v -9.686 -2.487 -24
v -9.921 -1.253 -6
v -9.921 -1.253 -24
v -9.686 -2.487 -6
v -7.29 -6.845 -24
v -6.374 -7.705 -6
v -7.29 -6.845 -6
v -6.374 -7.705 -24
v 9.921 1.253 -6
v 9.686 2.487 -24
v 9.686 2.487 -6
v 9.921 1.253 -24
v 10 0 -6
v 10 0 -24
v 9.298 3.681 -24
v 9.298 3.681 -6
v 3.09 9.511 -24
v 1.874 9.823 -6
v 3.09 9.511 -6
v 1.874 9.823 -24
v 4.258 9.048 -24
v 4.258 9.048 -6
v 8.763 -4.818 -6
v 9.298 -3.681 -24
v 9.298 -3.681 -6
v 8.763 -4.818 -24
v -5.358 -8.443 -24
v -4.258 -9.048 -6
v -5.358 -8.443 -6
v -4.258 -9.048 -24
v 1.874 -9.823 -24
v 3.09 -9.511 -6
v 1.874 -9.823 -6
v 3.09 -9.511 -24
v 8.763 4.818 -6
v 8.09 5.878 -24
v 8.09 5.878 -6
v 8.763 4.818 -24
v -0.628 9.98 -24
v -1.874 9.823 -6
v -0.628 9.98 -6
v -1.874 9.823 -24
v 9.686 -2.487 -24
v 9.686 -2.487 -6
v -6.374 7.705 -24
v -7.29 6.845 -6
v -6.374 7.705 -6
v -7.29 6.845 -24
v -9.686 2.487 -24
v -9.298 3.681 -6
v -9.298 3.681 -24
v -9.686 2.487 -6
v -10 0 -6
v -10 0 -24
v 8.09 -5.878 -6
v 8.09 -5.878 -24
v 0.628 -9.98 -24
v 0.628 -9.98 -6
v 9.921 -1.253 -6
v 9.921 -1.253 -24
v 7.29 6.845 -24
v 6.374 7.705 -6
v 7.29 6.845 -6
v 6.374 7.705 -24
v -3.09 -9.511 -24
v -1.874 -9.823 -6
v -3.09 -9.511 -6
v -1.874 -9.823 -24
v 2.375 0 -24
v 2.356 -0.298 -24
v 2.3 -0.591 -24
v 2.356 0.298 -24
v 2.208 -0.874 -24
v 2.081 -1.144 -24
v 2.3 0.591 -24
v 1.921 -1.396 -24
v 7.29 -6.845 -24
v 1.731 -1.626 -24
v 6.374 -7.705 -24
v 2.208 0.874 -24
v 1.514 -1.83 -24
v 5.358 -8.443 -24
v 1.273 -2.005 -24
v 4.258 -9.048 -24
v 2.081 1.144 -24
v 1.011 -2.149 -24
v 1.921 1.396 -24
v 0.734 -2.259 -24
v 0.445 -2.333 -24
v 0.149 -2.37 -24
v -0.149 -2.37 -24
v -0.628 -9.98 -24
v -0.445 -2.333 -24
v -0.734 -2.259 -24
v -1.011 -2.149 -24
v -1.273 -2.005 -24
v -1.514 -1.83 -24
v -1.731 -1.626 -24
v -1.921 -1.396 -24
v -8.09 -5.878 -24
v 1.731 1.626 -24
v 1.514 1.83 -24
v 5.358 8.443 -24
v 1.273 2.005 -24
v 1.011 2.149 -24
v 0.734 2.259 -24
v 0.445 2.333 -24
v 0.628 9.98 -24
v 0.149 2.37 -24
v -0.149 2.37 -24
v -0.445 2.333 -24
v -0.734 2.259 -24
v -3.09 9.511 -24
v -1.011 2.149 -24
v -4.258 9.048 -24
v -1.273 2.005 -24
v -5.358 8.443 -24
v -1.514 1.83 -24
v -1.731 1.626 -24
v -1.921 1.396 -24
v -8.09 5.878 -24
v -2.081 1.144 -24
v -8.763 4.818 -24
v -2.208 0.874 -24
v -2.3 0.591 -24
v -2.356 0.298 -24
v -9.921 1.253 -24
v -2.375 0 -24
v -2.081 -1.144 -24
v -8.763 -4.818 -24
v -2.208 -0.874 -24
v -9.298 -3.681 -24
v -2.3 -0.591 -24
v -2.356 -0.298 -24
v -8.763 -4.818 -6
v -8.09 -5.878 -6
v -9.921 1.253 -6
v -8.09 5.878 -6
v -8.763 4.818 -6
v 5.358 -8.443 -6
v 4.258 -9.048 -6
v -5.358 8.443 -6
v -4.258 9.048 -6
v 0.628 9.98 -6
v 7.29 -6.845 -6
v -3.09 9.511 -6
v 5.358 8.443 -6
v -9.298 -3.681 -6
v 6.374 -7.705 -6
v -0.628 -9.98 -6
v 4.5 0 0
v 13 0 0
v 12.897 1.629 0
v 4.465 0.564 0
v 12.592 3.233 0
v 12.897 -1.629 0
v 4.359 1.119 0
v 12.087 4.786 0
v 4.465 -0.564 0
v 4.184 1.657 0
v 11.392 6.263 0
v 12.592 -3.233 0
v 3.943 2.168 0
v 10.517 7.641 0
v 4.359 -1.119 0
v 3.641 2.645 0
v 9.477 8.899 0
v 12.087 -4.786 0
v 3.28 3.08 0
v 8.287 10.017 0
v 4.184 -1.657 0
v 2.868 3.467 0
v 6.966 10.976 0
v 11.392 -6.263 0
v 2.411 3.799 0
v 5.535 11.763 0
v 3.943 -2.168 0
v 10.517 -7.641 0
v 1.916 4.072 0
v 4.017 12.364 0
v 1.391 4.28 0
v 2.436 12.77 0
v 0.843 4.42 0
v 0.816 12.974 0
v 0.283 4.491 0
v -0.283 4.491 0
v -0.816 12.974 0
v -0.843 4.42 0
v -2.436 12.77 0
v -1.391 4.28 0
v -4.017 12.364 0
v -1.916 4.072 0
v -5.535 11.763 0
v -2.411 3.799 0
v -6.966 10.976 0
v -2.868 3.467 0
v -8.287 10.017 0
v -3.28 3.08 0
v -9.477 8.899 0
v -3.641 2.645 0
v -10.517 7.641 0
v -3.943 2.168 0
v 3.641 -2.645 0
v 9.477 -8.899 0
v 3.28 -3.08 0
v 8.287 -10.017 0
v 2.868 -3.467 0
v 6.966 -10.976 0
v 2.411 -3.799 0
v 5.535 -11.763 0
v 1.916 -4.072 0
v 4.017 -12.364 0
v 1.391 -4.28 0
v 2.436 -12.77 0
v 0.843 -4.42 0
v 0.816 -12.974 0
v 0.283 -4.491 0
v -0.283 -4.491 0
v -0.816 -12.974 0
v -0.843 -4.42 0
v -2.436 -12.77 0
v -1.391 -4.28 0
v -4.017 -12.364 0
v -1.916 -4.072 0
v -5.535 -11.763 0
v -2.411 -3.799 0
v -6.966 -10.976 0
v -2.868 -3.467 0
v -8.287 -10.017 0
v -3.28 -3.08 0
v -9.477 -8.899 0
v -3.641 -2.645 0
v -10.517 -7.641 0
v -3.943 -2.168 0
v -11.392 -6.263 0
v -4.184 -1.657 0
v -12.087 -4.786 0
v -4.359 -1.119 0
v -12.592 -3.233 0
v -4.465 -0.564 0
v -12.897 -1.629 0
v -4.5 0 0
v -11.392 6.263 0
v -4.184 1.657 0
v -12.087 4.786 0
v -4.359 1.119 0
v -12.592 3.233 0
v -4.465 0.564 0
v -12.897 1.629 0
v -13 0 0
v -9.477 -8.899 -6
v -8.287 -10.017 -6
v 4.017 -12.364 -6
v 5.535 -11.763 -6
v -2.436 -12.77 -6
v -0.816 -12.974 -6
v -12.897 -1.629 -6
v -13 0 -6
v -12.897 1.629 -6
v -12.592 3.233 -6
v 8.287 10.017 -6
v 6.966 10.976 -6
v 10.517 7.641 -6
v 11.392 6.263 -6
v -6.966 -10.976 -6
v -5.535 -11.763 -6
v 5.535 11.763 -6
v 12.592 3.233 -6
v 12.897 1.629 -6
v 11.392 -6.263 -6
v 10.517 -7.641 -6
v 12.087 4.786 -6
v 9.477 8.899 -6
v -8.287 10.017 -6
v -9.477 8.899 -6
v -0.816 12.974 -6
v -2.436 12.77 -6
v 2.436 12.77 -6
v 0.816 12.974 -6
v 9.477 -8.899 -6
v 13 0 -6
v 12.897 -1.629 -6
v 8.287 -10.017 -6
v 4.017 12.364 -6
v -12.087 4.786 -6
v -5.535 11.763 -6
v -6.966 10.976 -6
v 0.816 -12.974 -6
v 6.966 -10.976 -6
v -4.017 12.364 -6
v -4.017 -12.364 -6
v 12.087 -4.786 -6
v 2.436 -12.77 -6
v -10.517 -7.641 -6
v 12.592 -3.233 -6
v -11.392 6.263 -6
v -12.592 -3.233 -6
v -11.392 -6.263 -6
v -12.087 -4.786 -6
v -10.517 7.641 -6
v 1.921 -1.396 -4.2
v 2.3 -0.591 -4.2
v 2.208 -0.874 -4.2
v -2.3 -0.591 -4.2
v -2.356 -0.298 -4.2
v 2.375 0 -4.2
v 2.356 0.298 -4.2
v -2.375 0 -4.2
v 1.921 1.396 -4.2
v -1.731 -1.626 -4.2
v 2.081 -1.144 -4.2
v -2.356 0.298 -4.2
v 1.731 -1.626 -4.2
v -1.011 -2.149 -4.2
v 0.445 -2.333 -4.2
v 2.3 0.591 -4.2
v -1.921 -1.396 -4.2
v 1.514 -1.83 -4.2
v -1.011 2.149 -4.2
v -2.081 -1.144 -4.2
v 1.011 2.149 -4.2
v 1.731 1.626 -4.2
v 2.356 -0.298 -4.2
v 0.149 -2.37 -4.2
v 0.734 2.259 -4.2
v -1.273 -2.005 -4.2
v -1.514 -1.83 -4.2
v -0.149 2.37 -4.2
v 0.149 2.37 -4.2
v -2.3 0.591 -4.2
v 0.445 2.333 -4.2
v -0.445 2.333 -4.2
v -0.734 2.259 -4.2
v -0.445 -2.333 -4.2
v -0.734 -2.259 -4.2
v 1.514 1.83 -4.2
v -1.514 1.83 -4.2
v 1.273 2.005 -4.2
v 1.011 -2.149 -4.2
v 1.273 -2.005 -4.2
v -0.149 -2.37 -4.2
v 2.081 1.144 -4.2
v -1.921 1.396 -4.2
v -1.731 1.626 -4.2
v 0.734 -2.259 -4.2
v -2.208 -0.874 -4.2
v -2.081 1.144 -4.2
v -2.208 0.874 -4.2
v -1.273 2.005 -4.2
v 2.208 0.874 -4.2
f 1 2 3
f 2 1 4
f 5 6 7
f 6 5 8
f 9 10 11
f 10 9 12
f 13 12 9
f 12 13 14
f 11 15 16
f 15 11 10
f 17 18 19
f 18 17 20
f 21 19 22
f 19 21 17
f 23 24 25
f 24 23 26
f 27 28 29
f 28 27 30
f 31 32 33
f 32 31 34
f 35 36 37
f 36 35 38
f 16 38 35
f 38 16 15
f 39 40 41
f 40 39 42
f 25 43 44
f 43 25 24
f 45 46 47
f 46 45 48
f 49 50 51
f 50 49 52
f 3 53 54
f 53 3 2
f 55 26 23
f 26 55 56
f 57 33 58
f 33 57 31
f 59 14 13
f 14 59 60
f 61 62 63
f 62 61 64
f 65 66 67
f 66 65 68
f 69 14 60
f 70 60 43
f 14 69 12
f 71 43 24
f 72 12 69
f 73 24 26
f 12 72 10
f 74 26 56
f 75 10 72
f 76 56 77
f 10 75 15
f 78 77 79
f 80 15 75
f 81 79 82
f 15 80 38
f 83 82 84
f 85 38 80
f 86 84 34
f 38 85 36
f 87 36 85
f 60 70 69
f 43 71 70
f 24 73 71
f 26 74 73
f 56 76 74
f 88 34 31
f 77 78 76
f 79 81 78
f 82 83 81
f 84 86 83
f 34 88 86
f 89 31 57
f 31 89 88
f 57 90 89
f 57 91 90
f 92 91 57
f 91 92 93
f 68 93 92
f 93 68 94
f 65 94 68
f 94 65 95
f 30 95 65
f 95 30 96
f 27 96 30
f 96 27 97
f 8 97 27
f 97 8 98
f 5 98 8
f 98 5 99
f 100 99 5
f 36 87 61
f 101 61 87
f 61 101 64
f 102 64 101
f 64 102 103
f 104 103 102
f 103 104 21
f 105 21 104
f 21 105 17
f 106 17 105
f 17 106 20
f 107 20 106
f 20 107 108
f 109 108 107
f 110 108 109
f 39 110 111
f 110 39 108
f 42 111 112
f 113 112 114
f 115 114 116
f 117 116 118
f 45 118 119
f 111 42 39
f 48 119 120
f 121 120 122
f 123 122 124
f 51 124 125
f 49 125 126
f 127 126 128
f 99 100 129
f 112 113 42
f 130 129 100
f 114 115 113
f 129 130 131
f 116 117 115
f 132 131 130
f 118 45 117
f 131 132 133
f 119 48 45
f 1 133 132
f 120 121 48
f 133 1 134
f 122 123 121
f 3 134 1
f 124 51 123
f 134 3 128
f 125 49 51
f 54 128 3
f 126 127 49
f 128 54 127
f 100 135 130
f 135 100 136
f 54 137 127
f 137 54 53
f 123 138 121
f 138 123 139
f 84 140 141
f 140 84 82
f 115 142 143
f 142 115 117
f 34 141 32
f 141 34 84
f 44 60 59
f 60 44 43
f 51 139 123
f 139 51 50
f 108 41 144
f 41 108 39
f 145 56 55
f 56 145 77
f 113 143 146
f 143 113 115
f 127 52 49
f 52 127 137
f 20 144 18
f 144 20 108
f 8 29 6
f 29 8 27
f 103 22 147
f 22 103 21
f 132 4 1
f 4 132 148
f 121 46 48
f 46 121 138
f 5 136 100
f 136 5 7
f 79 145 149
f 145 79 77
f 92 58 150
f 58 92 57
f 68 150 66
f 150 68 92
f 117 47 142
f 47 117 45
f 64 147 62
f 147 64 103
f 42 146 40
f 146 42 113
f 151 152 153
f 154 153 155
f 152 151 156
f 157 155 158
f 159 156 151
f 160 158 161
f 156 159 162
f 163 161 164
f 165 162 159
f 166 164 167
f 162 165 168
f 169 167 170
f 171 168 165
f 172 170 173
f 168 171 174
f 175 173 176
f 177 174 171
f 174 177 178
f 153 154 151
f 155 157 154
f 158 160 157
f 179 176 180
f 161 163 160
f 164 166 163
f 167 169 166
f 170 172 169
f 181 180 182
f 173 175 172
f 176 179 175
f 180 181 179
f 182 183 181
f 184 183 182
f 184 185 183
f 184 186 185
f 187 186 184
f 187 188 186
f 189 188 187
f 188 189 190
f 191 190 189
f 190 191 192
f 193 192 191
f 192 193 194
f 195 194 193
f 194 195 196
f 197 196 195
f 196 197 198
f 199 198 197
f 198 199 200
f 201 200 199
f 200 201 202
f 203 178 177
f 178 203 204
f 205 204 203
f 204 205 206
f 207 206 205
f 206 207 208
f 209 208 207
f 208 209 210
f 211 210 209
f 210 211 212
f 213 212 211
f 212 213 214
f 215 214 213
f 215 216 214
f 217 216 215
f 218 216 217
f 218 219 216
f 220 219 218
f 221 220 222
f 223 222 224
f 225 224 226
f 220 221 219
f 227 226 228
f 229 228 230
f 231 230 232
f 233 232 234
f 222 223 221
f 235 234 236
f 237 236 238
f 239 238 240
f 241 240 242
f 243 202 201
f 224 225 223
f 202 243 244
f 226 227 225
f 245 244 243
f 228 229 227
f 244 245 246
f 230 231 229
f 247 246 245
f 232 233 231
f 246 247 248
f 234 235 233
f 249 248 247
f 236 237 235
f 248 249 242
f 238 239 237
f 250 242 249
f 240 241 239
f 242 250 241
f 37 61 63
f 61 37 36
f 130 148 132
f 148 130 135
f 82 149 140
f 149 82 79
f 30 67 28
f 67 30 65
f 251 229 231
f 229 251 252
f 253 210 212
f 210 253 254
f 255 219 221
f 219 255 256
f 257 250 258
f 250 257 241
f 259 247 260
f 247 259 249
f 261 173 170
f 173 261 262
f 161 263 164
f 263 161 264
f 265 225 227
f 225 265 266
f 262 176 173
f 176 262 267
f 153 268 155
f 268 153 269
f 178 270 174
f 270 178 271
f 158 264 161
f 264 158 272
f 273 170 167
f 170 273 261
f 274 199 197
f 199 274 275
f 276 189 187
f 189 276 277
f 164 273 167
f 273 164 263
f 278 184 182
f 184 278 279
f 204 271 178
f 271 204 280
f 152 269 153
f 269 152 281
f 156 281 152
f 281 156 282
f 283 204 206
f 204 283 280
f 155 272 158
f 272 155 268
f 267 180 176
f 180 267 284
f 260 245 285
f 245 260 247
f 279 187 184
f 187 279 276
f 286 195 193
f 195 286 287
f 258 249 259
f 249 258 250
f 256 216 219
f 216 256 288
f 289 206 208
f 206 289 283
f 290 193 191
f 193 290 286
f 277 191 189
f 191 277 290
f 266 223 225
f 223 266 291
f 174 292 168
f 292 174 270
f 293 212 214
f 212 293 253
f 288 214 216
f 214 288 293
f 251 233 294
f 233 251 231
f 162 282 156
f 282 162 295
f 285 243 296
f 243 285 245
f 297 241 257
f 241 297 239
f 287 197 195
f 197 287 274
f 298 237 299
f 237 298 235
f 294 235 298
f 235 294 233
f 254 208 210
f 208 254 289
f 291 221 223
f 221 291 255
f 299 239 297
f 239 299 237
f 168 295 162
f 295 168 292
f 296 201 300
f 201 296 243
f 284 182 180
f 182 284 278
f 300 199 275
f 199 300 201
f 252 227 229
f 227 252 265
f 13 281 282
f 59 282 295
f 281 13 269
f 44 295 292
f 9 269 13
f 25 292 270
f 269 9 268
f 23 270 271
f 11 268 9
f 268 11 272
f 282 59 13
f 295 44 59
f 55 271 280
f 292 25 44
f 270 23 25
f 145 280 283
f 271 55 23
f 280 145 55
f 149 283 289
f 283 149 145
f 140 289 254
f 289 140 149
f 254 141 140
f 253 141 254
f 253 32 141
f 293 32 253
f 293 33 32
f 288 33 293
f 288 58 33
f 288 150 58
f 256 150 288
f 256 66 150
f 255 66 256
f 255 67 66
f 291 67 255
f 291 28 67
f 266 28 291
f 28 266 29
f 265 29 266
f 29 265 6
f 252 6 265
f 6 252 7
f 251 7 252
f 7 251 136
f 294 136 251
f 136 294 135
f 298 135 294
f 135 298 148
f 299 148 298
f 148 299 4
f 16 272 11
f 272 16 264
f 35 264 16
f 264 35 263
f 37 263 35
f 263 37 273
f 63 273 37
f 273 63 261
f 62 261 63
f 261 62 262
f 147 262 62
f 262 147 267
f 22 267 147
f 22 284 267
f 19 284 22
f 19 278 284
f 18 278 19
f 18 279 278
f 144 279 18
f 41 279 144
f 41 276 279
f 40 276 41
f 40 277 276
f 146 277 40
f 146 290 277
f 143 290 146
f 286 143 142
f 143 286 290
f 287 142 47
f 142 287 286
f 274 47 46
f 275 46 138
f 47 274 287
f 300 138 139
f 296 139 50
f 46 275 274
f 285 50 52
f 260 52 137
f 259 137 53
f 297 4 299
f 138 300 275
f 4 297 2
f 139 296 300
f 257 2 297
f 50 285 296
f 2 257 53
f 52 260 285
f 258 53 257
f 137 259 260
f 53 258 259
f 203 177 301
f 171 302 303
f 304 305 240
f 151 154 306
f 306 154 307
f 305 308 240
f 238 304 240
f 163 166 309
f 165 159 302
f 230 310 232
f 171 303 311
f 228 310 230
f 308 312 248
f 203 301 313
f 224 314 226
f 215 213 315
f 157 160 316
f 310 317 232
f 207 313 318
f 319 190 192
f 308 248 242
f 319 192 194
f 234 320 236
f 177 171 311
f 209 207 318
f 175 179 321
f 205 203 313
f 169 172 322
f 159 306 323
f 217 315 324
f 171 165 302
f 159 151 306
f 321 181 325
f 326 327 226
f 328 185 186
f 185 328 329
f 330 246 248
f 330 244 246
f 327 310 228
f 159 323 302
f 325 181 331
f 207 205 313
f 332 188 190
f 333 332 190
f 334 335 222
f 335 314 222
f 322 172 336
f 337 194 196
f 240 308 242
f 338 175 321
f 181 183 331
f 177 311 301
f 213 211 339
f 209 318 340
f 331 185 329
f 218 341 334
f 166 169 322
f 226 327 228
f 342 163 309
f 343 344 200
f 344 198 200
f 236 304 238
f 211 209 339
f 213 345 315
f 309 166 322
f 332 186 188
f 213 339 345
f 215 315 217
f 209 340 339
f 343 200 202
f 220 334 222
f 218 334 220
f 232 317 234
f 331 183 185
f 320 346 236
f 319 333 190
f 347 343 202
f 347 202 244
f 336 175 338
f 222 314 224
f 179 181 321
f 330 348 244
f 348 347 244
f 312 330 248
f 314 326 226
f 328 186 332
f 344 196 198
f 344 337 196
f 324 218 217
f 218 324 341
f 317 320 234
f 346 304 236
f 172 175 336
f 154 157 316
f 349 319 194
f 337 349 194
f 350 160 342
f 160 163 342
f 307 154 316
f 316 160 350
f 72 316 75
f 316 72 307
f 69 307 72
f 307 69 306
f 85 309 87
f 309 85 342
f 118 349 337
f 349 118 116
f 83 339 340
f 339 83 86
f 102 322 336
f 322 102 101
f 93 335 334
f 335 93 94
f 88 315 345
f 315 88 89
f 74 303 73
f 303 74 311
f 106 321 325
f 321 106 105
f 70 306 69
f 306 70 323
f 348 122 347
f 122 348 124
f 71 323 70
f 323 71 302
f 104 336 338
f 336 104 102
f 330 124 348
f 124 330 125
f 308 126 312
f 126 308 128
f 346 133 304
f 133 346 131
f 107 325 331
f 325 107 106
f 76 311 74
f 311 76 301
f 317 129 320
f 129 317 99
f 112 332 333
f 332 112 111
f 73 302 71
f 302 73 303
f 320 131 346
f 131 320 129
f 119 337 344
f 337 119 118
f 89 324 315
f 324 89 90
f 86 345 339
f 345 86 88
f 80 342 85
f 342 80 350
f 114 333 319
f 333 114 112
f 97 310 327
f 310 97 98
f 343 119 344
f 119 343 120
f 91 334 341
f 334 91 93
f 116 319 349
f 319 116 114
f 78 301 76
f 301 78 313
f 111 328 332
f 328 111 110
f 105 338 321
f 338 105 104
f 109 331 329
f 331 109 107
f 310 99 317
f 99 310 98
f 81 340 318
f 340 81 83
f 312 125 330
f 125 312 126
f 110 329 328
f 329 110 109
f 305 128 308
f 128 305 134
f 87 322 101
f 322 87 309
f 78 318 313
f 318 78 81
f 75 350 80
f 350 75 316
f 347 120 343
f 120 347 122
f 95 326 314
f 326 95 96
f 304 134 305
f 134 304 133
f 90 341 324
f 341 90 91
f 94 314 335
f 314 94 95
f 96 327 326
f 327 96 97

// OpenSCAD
$fn = 50;


difference() {
	union() {
		translate(v = [0, 0, -24.0000000000]) {
			cylinder(h = 24, r = 10.0000000000);
		}
		translate(v = [0, 0, -6.0000000000]) {
			cylinder(h = 6, r = 13.0000000000);
		}
	}
	union() {
		translate(v = [0, 0, 0]) {
			rotate(a = [0, 0, 0]) {
				difference() {
					union() {
						#translate(v = [0, 0, -24.0000000000]) {
							cylinder(h = 24, r = 2.2500000000);
						}
						#translate(v = [0, 0, -4.2000000000]) {
							cylinder(h = 4.2000000000, r1 = 2.3750000000, r2 = 4.5000000000);
						}
						#translate(v = [0, 0, -24.0000000000]) {
							cylinder(h = 24, r = 2.3750000000);
						}
						#translate(v = [0, 0, -24.0000000000]) {
							cylinder(h = 24, r = 2.2500000000);
						}
					}
					union();
				}
			}
		}
	}
}
